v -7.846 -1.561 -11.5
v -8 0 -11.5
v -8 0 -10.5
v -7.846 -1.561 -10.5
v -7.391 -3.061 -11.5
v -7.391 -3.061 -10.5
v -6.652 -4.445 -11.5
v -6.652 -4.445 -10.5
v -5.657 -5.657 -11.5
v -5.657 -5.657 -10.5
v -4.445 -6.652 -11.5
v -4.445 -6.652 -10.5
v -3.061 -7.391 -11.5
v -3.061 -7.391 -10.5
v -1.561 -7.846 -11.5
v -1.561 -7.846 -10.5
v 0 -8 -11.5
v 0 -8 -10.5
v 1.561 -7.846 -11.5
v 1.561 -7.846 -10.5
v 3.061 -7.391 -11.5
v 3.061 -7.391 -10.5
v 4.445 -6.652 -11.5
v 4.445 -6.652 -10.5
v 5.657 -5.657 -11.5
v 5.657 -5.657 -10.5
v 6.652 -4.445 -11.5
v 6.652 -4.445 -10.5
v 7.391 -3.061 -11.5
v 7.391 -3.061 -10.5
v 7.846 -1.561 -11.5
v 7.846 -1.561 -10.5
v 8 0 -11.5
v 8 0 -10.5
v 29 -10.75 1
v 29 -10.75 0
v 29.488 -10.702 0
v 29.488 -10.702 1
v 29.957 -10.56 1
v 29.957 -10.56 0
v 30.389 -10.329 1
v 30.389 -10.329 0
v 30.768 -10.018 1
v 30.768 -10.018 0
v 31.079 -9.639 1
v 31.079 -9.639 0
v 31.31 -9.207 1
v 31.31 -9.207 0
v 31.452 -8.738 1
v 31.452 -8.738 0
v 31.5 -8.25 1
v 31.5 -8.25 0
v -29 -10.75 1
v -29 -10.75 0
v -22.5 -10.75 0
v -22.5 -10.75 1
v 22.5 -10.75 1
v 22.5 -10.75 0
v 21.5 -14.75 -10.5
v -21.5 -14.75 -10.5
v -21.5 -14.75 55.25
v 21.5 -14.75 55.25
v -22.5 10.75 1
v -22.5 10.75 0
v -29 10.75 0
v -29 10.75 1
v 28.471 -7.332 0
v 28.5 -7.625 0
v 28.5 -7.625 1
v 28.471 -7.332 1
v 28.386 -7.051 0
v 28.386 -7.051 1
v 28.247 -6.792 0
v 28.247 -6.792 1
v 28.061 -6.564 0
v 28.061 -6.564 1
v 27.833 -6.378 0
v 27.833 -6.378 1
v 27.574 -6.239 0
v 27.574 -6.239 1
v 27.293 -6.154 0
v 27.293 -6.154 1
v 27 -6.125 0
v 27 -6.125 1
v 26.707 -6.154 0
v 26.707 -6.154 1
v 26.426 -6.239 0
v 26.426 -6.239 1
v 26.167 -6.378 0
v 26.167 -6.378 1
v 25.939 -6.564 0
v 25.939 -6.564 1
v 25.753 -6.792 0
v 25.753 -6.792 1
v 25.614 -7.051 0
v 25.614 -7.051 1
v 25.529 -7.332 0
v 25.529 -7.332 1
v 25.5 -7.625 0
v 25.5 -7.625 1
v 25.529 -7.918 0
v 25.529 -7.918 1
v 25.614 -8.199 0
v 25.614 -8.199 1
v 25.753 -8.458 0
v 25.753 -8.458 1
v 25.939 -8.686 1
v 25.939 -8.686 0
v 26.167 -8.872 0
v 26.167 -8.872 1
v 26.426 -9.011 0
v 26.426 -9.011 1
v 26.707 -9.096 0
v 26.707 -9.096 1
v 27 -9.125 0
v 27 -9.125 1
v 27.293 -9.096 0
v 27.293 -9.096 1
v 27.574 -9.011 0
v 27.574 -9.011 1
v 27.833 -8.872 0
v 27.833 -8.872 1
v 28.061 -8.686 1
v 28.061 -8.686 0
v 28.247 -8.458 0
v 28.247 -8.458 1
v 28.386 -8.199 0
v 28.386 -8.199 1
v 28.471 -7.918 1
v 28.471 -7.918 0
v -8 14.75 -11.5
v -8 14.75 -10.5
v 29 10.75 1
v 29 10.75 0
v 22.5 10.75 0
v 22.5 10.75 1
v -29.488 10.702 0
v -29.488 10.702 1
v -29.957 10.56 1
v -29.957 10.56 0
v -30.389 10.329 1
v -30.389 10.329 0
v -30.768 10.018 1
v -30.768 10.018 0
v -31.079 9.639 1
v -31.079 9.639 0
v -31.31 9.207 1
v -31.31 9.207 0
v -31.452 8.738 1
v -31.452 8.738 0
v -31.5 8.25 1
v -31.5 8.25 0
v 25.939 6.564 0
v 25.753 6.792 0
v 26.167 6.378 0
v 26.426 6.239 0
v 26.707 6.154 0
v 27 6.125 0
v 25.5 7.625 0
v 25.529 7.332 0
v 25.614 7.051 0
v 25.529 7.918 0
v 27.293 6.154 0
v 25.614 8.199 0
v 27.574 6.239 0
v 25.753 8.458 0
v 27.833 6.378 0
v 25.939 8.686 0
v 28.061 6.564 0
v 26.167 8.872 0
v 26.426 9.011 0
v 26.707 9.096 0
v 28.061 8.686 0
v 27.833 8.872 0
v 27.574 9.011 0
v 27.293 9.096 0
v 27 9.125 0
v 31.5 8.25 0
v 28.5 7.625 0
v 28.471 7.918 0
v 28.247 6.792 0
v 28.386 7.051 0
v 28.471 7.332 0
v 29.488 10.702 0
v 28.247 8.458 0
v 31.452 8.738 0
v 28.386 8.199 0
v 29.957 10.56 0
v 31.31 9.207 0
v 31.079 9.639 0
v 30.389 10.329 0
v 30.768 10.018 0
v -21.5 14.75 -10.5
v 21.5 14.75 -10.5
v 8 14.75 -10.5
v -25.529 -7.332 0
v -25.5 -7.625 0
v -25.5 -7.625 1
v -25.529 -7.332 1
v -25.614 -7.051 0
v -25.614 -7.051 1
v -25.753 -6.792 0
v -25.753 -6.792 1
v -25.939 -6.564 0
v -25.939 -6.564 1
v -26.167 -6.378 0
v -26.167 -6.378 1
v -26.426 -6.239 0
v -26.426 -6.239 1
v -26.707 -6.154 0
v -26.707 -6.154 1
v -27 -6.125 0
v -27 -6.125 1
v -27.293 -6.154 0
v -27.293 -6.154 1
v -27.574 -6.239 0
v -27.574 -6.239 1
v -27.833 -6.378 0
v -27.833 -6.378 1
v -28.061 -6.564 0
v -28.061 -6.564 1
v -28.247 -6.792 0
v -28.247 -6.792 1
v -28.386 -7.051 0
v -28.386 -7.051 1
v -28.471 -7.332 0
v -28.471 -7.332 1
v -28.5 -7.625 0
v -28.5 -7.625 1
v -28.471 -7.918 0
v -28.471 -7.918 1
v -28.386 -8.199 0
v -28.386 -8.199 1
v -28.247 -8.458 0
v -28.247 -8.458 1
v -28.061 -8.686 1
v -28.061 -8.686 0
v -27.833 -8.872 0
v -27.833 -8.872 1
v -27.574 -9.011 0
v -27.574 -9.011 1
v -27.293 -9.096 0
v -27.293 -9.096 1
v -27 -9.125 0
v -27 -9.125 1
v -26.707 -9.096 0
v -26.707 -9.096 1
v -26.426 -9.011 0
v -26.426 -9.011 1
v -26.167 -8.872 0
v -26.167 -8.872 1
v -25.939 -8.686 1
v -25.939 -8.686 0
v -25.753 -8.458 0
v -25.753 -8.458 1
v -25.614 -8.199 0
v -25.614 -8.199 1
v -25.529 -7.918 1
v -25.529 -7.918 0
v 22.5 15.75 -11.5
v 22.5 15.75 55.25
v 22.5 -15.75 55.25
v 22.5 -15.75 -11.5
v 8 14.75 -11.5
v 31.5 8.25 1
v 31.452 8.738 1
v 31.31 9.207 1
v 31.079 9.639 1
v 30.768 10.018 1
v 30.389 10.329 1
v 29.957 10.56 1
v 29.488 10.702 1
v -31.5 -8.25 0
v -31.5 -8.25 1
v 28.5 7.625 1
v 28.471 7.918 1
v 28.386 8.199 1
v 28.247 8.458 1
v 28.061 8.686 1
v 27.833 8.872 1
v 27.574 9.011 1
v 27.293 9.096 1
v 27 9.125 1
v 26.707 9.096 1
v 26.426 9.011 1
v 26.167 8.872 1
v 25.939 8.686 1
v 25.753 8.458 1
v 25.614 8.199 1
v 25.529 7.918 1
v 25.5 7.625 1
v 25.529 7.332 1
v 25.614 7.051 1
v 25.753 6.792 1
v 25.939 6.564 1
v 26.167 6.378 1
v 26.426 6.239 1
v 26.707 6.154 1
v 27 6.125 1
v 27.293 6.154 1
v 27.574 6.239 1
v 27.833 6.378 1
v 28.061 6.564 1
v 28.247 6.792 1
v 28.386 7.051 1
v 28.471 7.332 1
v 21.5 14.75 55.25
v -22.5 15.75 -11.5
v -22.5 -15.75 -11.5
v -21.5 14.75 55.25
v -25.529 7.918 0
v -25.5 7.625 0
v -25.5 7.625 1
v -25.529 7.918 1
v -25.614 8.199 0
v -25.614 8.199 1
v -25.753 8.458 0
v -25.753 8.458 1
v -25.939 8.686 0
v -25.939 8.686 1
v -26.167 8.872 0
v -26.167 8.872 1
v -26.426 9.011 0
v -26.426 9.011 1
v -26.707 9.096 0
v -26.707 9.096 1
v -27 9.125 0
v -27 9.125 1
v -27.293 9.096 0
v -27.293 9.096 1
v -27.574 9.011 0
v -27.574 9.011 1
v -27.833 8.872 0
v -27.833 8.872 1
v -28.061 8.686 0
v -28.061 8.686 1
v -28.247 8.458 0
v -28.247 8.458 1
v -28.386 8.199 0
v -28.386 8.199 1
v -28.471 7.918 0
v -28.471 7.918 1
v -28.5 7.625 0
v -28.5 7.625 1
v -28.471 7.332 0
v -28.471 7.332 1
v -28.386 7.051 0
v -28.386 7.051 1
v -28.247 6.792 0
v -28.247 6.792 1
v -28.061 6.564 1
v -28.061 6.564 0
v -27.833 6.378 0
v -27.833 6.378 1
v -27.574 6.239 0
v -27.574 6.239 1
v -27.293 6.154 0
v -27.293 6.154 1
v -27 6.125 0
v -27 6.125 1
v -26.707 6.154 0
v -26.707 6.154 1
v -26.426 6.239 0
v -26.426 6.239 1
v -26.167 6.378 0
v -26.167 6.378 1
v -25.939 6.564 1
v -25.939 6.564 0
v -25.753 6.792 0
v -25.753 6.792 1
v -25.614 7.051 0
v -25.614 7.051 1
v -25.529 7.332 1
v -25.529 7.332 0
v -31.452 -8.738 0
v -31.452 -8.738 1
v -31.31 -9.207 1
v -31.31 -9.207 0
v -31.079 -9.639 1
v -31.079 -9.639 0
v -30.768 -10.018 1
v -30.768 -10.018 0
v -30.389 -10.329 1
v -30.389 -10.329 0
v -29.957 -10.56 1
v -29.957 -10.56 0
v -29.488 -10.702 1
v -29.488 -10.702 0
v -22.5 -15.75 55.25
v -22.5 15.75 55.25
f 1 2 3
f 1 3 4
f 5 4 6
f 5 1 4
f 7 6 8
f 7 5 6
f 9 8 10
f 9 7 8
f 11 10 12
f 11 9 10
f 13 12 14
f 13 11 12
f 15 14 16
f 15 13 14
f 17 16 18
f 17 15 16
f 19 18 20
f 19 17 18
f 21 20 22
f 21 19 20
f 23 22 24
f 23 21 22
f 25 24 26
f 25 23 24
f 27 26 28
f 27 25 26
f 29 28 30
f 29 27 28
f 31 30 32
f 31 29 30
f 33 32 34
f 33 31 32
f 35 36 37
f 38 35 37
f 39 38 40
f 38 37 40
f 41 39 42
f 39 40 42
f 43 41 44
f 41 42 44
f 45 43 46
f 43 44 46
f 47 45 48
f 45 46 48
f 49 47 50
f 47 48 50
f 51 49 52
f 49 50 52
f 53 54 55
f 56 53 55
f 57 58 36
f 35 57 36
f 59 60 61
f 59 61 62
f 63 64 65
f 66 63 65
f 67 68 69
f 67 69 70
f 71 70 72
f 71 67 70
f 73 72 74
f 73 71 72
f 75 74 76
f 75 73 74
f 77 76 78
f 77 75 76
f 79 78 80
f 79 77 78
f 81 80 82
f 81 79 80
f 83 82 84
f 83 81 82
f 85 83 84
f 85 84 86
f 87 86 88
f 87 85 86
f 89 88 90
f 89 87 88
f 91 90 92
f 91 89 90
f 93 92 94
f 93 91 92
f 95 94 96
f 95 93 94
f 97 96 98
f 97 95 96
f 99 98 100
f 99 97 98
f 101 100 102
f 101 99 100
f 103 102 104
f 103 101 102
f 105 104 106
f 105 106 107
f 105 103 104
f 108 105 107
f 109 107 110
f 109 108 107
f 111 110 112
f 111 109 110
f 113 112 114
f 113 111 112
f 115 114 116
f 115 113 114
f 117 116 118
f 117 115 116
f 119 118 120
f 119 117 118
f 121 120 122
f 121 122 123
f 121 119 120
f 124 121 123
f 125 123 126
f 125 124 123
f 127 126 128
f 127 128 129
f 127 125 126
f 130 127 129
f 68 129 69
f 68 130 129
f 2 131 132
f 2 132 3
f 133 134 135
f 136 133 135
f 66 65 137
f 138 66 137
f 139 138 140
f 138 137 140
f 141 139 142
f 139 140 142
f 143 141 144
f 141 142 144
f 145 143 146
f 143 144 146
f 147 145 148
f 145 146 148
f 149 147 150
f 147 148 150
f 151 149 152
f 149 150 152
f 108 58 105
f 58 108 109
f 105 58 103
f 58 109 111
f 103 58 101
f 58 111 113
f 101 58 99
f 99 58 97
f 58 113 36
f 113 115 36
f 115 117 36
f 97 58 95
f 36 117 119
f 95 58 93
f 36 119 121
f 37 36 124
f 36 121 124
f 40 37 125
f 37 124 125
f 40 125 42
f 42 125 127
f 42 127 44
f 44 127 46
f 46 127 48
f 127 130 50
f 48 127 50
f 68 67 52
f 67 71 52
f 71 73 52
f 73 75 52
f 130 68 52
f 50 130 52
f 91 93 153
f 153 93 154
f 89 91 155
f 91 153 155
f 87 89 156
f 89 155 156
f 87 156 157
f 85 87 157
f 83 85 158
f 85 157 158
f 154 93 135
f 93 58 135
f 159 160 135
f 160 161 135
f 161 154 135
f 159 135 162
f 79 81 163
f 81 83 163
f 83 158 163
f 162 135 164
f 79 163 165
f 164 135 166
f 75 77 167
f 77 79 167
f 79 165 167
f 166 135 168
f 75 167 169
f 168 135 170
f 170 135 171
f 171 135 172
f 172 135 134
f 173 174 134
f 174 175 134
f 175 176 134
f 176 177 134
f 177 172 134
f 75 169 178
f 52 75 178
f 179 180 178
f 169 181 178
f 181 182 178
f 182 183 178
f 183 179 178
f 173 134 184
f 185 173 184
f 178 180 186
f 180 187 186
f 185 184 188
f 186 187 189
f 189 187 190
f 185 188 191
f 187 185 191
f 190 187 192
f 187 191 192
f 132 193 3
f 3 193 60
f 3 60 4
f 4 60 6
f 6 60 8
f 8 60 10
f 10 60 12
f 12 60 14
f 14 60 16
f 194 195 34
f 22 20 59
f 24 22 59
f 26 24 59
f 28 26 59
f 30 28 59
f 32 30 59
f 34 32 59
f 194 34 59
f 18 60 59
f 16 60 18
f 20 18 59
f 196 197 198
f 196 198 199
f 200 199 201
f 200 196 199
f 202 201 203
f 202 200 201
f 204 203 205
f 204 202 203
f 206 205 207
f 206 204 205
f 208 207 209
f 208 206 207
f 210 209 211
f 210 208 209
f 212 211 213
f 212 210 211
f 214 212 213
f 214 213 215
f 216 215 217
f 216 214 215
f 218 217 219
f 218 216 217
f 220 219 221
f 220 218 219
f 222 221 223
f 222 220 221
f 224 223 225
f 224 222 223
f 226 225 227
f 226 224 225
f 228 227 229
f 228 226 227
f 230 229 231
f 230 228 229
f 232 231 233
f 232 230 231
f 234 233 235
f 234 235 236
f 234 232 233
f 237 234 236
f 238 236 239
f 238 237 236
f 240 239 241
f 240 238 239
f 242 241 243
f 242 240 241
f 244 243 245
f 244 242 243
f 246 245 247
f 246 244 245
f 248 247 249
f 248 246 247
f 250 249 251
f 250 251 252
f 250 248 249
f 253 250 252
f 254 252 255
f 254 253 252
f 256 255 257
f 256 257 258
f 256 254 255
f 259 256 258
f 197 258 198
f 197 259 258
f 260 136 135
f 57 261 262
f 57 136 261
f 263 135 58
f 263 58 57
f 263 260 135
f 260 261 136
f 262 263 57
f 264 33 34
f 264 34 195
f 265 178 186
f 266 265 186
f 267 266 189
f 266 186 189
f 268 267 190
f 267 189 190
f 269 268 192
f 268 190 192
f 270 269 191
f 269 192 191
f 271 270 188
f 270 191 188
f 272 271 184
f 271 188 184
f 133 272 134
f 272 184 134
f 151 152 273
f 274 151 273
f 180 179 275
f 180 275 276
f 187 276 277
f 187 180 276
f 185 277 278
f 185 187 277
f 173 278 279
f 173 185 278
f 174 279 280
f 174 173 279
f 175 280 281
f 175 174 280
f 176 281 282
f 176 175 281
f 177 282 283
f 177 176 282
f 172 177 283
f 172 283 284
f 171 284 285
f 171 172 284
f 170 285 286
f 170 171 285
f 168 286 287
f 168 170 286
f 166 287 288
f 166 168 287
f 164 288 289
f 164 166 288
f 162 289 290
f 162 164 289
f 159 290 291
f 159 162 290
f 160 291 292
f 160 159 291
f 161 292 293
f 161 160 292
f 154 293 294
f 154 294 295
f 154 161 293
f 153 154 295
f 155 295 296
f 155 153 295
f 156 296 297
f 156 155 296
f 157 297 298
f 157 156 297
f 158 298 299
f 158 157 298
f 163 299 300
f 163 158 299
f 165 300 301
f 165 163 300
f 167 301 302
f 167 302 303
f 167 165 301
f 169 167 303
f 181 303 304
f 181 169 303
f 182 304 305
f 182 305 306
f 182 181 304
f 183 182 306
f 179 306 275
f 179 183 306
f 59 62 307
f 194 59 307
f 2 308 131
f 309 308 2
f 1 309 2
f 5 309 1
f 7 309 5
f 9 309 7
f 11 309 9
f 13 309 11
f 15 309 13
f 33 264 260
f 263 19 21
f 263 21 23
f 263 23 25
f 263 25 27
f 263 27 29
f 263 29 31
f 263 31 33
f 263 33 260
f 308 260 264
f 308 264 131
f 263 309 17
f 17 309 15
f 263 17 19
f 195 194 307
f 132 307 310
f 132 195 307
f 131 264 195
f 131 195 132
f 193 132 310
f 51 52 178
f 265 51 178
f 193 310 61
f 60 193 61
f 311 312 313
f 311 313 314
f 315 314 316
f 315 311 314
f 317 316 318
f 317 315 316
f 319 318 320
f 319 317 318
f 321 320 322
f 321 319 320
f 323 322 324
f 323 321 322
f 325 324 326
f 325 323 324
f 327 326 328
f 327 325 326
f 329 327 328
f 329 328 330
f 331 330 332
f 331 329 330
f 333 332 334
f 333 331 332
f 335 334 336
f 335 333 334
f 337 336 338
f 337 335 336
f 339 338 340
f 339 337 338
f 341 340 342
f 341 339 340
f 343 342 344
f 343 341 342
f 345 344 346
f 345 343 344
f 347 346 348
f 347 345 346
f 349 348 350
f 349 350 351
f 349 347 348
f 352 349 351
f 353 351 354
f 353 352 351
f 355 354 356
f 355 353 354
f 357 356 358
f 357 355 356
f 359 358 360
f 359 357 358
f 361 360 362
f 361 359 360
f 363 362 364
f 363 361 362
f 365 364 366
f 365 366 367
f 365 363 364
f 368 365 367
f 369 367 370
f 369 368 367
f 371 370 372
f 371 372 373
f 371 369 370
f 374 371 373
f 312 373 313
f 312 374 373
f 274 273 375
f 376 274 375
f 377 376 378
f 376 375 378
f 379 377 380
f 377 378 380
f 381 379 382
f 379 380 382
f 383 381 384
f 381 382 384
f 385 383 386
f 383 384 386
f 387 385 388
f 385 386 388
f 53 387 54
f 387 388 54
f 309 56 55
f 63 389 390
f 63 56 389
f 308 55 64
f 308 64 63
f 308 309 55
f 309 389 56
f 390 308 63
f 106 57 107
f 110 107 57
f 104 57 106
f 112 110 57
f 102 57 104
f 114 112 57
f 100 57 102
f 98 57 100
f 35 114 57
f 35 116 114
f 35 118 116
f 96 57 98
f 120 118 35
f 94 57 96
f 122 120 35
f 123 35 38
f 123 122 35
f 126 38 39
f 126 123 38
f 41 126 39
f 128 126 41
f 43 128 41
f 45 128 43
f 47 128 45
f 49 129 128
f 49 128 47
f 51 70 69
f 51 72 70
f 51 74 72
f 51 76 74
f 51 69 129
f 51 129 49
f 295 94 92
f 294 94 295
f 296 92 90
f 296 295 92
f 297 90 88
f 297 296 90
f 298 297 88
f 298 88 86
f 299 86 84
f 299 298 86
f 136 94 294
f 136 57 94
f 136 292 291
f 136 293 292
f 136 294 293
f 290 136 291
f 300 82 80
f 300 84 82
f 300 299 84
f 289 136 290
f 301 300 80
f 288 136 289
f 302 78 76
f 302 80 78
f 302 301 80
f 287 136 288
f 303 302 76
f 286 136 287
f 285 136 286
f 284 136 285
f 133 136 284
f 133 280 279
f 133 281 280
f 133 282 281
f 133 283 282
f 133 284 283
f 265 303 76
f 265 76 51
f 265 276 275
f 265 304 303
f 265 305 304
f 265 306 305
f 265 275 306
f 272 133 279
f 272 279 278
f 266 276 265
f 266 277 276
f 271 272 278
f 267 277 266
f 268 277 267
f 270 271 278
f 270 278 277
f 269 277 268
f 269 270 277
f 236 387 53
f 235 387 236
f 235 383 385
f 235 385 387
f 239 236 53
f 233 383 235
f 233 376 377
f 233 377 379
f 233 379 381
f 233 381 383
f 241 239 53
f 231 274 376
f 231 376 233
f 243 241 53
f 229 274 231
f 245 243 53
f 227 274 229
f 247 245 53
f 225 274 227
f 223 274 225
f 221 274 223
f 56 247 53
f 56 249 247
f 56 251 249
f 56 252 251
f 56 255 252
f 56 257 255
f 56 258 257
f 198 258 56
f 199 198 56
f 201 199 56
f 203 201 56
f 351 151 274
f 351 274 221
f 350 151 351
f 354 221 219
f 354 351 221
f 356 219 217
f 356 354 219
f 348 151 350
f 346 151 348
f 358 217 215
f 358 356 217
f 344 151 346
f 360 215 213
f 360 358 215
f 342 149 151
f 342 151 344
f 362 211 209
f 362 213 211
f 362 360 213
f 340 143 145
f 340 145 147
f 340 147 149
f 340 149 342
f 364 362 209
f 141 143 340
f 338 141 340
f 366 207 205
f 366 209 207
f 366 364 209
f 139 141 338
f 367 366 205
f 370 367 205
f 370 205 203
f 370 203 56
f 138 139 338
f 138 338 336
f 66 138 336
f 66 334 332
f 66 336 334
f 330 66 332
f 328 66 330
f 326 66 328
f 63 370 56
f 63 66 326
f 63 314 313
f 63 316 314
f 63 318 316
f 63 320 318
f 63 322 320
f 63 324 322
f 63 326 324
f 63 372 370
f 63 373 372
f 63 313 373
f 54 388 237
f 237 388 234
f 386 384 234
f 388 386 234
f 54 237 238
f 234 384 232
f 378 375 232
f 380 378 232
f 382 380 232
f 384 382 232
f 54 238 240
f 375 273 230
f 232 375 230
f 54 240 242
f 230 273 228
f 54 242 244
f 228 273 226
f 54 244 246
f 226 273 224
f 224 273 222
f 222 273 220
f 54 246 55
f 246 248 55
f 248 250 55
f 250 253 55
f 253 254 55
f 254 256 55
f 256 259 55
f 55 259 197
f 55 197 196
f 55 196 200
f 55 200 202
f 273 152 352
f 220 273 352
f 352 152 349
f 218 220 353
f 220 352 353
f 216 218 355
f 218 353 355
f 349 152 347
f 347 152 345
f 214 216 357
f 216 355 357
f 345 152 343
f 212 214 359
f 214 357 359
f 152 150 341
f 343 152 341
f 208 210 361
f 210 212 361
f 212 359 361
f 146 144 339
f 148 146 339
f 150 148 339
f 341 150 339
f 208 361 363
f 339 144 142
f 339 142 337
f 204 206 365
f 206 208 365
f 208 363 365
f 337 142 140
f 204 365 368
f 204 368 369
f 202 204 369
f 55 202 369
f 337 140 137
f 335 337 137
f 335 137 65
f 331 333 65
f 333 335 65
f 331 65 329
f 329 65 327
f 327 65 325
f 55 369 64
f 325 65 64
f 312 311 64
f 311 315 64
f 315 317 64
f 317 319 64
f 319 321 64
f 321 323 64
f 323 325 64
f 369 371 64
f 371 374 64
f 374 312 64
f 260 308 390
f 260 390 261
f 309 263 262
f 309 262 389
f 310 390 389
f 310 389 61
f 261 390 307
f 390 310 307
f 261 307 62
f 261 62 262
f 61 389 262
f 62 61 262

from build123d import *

# Parameters (mm, degrees)
F0_R     = 1.5
F1_DEPTH = 1
F4_DEPTH = 66.75
F5_DEPTH = 1


with BuildPart() as f1:
    # F0 (on Top) → F1 (new body)
    with BuildSketch(Plane.XY):
        with BuildLine():
            ThreePointArc((-29, 10.75), (-30.767766953, 10.017766953), (-31.5, 8.25))
            Line((-31.5, 8.25), (-31.5, -8.25))
            ThreePointArc((-31.5, -8.25), (-30.767766953, -10.017766953), (-29, -10.75))
            Line((-29, -10.75), (-22.5, -10.75))
            Line((-22.5, -10.75), (-22.5, 10.75))
            Line((-22.5, 10.75), (-29, 10.75))
        make_face()
        with Locations((-27, -7.625)):
            Circle(F0_R, mode=Mode.SUBTRACT)
        with Locations((-27, 7.625)):
            Circle(F0_R, mode=Mode.SUBTRACT)
    extrude(amount=F1_DEPTH)



with BuildPart() as f1b:
    # F0 (on Top) → F1, piece 2 (new body)
    with BuildSketch(Plane.XY):
        with BuildLine():
            Line((29, 10.75), (22.5, 10.75))
            Line((22.5, 10.75), (22.5, -10.75))
            Line((22.5, -10.75), (29, -10.75))
            ThreePointArc((29, -10.75), (30.767766953, -10.017766953), (31.5, -8.25))
            Line((31.5, -8.25), (31.5, 8.25))
            ThreePointArc((31.5, 8.25), (30.767766953, 10.017766953), (29, 10.75))
        make_face()
        with Locations((27, -7.625)):
            Circle(F0_R, mode=Mode.SUBTRACT)
        with Locations((27, 7.625)):
            Circle(F0_R, mode=Mode.SUBTRACT)
    extrude(amount=F1_DEPTH)


with BuildPart() as f1_1:
    add(f1.part)

    add(f1b.part)  # F4 merges F1b
    # F3 (on offset) → F4 (join)
    with BuildSketch(Plane(origin=(0, 0, -11.5), x_dir=(1, 0, 0), z_dir=(0, 0, -1))):
        Polygon((-22.5, 10.75), (-22.5, -10.75), (-22.5, -15.75), (22.5, -15.75), (22.5, -10.75), (22.5, 10.75), (22.5, 15.75), (-22.5, 15.75), align=None)
        Polygon((-21.5, -14.75), (-21.5, -10.75), (-21.5, 10.75), (-21.5, 14.75), (21.5, 14.75), (21.5, 10.75), (21.5, -10.75), (21.5, -14.75), (8, -14.75), (-8, -14.75), align=None, mode=Mode.SUBTRACT)
    extrude(amount=-F4_DEPTH)

    # F3 (on offset) → F5 (join)
    with BuildSketch(Plane(origin=(0, 0, -11.5), x_dir=(1, 0, 0), z_dir=(0, 0, -1))):
        with BuildLine():
            Line((-21.5, 10.75), (-21.5, -10.75))
            Line((-21.5, -10.75), (-21.5, -14.75))
            Line((-21.5, -14.75), (-8, -14.75))
            Line((-8, -14.75), (-8, 0))
            ThreePointArc((-8, 0), (0, 8), (8, 0))
            Line((8, 0), (8, -14.75))
            Line((8, -14.75), (21.5, -14.75))
            Line((21.5, -14.75), (21.5, -10.75))
            Line((21.5, -10.75), (21.5, 10.75))
            Line((21.5, 10.75), (21.5, 14.75))
            Line((21.5, 14.75), (-21.5, 14.75))
            Line((-21.5, 14.75), (-21.5, 10.75))
        make_face()
    extrude(amount=-F5_DEPTH)


solid = f1_1.part
